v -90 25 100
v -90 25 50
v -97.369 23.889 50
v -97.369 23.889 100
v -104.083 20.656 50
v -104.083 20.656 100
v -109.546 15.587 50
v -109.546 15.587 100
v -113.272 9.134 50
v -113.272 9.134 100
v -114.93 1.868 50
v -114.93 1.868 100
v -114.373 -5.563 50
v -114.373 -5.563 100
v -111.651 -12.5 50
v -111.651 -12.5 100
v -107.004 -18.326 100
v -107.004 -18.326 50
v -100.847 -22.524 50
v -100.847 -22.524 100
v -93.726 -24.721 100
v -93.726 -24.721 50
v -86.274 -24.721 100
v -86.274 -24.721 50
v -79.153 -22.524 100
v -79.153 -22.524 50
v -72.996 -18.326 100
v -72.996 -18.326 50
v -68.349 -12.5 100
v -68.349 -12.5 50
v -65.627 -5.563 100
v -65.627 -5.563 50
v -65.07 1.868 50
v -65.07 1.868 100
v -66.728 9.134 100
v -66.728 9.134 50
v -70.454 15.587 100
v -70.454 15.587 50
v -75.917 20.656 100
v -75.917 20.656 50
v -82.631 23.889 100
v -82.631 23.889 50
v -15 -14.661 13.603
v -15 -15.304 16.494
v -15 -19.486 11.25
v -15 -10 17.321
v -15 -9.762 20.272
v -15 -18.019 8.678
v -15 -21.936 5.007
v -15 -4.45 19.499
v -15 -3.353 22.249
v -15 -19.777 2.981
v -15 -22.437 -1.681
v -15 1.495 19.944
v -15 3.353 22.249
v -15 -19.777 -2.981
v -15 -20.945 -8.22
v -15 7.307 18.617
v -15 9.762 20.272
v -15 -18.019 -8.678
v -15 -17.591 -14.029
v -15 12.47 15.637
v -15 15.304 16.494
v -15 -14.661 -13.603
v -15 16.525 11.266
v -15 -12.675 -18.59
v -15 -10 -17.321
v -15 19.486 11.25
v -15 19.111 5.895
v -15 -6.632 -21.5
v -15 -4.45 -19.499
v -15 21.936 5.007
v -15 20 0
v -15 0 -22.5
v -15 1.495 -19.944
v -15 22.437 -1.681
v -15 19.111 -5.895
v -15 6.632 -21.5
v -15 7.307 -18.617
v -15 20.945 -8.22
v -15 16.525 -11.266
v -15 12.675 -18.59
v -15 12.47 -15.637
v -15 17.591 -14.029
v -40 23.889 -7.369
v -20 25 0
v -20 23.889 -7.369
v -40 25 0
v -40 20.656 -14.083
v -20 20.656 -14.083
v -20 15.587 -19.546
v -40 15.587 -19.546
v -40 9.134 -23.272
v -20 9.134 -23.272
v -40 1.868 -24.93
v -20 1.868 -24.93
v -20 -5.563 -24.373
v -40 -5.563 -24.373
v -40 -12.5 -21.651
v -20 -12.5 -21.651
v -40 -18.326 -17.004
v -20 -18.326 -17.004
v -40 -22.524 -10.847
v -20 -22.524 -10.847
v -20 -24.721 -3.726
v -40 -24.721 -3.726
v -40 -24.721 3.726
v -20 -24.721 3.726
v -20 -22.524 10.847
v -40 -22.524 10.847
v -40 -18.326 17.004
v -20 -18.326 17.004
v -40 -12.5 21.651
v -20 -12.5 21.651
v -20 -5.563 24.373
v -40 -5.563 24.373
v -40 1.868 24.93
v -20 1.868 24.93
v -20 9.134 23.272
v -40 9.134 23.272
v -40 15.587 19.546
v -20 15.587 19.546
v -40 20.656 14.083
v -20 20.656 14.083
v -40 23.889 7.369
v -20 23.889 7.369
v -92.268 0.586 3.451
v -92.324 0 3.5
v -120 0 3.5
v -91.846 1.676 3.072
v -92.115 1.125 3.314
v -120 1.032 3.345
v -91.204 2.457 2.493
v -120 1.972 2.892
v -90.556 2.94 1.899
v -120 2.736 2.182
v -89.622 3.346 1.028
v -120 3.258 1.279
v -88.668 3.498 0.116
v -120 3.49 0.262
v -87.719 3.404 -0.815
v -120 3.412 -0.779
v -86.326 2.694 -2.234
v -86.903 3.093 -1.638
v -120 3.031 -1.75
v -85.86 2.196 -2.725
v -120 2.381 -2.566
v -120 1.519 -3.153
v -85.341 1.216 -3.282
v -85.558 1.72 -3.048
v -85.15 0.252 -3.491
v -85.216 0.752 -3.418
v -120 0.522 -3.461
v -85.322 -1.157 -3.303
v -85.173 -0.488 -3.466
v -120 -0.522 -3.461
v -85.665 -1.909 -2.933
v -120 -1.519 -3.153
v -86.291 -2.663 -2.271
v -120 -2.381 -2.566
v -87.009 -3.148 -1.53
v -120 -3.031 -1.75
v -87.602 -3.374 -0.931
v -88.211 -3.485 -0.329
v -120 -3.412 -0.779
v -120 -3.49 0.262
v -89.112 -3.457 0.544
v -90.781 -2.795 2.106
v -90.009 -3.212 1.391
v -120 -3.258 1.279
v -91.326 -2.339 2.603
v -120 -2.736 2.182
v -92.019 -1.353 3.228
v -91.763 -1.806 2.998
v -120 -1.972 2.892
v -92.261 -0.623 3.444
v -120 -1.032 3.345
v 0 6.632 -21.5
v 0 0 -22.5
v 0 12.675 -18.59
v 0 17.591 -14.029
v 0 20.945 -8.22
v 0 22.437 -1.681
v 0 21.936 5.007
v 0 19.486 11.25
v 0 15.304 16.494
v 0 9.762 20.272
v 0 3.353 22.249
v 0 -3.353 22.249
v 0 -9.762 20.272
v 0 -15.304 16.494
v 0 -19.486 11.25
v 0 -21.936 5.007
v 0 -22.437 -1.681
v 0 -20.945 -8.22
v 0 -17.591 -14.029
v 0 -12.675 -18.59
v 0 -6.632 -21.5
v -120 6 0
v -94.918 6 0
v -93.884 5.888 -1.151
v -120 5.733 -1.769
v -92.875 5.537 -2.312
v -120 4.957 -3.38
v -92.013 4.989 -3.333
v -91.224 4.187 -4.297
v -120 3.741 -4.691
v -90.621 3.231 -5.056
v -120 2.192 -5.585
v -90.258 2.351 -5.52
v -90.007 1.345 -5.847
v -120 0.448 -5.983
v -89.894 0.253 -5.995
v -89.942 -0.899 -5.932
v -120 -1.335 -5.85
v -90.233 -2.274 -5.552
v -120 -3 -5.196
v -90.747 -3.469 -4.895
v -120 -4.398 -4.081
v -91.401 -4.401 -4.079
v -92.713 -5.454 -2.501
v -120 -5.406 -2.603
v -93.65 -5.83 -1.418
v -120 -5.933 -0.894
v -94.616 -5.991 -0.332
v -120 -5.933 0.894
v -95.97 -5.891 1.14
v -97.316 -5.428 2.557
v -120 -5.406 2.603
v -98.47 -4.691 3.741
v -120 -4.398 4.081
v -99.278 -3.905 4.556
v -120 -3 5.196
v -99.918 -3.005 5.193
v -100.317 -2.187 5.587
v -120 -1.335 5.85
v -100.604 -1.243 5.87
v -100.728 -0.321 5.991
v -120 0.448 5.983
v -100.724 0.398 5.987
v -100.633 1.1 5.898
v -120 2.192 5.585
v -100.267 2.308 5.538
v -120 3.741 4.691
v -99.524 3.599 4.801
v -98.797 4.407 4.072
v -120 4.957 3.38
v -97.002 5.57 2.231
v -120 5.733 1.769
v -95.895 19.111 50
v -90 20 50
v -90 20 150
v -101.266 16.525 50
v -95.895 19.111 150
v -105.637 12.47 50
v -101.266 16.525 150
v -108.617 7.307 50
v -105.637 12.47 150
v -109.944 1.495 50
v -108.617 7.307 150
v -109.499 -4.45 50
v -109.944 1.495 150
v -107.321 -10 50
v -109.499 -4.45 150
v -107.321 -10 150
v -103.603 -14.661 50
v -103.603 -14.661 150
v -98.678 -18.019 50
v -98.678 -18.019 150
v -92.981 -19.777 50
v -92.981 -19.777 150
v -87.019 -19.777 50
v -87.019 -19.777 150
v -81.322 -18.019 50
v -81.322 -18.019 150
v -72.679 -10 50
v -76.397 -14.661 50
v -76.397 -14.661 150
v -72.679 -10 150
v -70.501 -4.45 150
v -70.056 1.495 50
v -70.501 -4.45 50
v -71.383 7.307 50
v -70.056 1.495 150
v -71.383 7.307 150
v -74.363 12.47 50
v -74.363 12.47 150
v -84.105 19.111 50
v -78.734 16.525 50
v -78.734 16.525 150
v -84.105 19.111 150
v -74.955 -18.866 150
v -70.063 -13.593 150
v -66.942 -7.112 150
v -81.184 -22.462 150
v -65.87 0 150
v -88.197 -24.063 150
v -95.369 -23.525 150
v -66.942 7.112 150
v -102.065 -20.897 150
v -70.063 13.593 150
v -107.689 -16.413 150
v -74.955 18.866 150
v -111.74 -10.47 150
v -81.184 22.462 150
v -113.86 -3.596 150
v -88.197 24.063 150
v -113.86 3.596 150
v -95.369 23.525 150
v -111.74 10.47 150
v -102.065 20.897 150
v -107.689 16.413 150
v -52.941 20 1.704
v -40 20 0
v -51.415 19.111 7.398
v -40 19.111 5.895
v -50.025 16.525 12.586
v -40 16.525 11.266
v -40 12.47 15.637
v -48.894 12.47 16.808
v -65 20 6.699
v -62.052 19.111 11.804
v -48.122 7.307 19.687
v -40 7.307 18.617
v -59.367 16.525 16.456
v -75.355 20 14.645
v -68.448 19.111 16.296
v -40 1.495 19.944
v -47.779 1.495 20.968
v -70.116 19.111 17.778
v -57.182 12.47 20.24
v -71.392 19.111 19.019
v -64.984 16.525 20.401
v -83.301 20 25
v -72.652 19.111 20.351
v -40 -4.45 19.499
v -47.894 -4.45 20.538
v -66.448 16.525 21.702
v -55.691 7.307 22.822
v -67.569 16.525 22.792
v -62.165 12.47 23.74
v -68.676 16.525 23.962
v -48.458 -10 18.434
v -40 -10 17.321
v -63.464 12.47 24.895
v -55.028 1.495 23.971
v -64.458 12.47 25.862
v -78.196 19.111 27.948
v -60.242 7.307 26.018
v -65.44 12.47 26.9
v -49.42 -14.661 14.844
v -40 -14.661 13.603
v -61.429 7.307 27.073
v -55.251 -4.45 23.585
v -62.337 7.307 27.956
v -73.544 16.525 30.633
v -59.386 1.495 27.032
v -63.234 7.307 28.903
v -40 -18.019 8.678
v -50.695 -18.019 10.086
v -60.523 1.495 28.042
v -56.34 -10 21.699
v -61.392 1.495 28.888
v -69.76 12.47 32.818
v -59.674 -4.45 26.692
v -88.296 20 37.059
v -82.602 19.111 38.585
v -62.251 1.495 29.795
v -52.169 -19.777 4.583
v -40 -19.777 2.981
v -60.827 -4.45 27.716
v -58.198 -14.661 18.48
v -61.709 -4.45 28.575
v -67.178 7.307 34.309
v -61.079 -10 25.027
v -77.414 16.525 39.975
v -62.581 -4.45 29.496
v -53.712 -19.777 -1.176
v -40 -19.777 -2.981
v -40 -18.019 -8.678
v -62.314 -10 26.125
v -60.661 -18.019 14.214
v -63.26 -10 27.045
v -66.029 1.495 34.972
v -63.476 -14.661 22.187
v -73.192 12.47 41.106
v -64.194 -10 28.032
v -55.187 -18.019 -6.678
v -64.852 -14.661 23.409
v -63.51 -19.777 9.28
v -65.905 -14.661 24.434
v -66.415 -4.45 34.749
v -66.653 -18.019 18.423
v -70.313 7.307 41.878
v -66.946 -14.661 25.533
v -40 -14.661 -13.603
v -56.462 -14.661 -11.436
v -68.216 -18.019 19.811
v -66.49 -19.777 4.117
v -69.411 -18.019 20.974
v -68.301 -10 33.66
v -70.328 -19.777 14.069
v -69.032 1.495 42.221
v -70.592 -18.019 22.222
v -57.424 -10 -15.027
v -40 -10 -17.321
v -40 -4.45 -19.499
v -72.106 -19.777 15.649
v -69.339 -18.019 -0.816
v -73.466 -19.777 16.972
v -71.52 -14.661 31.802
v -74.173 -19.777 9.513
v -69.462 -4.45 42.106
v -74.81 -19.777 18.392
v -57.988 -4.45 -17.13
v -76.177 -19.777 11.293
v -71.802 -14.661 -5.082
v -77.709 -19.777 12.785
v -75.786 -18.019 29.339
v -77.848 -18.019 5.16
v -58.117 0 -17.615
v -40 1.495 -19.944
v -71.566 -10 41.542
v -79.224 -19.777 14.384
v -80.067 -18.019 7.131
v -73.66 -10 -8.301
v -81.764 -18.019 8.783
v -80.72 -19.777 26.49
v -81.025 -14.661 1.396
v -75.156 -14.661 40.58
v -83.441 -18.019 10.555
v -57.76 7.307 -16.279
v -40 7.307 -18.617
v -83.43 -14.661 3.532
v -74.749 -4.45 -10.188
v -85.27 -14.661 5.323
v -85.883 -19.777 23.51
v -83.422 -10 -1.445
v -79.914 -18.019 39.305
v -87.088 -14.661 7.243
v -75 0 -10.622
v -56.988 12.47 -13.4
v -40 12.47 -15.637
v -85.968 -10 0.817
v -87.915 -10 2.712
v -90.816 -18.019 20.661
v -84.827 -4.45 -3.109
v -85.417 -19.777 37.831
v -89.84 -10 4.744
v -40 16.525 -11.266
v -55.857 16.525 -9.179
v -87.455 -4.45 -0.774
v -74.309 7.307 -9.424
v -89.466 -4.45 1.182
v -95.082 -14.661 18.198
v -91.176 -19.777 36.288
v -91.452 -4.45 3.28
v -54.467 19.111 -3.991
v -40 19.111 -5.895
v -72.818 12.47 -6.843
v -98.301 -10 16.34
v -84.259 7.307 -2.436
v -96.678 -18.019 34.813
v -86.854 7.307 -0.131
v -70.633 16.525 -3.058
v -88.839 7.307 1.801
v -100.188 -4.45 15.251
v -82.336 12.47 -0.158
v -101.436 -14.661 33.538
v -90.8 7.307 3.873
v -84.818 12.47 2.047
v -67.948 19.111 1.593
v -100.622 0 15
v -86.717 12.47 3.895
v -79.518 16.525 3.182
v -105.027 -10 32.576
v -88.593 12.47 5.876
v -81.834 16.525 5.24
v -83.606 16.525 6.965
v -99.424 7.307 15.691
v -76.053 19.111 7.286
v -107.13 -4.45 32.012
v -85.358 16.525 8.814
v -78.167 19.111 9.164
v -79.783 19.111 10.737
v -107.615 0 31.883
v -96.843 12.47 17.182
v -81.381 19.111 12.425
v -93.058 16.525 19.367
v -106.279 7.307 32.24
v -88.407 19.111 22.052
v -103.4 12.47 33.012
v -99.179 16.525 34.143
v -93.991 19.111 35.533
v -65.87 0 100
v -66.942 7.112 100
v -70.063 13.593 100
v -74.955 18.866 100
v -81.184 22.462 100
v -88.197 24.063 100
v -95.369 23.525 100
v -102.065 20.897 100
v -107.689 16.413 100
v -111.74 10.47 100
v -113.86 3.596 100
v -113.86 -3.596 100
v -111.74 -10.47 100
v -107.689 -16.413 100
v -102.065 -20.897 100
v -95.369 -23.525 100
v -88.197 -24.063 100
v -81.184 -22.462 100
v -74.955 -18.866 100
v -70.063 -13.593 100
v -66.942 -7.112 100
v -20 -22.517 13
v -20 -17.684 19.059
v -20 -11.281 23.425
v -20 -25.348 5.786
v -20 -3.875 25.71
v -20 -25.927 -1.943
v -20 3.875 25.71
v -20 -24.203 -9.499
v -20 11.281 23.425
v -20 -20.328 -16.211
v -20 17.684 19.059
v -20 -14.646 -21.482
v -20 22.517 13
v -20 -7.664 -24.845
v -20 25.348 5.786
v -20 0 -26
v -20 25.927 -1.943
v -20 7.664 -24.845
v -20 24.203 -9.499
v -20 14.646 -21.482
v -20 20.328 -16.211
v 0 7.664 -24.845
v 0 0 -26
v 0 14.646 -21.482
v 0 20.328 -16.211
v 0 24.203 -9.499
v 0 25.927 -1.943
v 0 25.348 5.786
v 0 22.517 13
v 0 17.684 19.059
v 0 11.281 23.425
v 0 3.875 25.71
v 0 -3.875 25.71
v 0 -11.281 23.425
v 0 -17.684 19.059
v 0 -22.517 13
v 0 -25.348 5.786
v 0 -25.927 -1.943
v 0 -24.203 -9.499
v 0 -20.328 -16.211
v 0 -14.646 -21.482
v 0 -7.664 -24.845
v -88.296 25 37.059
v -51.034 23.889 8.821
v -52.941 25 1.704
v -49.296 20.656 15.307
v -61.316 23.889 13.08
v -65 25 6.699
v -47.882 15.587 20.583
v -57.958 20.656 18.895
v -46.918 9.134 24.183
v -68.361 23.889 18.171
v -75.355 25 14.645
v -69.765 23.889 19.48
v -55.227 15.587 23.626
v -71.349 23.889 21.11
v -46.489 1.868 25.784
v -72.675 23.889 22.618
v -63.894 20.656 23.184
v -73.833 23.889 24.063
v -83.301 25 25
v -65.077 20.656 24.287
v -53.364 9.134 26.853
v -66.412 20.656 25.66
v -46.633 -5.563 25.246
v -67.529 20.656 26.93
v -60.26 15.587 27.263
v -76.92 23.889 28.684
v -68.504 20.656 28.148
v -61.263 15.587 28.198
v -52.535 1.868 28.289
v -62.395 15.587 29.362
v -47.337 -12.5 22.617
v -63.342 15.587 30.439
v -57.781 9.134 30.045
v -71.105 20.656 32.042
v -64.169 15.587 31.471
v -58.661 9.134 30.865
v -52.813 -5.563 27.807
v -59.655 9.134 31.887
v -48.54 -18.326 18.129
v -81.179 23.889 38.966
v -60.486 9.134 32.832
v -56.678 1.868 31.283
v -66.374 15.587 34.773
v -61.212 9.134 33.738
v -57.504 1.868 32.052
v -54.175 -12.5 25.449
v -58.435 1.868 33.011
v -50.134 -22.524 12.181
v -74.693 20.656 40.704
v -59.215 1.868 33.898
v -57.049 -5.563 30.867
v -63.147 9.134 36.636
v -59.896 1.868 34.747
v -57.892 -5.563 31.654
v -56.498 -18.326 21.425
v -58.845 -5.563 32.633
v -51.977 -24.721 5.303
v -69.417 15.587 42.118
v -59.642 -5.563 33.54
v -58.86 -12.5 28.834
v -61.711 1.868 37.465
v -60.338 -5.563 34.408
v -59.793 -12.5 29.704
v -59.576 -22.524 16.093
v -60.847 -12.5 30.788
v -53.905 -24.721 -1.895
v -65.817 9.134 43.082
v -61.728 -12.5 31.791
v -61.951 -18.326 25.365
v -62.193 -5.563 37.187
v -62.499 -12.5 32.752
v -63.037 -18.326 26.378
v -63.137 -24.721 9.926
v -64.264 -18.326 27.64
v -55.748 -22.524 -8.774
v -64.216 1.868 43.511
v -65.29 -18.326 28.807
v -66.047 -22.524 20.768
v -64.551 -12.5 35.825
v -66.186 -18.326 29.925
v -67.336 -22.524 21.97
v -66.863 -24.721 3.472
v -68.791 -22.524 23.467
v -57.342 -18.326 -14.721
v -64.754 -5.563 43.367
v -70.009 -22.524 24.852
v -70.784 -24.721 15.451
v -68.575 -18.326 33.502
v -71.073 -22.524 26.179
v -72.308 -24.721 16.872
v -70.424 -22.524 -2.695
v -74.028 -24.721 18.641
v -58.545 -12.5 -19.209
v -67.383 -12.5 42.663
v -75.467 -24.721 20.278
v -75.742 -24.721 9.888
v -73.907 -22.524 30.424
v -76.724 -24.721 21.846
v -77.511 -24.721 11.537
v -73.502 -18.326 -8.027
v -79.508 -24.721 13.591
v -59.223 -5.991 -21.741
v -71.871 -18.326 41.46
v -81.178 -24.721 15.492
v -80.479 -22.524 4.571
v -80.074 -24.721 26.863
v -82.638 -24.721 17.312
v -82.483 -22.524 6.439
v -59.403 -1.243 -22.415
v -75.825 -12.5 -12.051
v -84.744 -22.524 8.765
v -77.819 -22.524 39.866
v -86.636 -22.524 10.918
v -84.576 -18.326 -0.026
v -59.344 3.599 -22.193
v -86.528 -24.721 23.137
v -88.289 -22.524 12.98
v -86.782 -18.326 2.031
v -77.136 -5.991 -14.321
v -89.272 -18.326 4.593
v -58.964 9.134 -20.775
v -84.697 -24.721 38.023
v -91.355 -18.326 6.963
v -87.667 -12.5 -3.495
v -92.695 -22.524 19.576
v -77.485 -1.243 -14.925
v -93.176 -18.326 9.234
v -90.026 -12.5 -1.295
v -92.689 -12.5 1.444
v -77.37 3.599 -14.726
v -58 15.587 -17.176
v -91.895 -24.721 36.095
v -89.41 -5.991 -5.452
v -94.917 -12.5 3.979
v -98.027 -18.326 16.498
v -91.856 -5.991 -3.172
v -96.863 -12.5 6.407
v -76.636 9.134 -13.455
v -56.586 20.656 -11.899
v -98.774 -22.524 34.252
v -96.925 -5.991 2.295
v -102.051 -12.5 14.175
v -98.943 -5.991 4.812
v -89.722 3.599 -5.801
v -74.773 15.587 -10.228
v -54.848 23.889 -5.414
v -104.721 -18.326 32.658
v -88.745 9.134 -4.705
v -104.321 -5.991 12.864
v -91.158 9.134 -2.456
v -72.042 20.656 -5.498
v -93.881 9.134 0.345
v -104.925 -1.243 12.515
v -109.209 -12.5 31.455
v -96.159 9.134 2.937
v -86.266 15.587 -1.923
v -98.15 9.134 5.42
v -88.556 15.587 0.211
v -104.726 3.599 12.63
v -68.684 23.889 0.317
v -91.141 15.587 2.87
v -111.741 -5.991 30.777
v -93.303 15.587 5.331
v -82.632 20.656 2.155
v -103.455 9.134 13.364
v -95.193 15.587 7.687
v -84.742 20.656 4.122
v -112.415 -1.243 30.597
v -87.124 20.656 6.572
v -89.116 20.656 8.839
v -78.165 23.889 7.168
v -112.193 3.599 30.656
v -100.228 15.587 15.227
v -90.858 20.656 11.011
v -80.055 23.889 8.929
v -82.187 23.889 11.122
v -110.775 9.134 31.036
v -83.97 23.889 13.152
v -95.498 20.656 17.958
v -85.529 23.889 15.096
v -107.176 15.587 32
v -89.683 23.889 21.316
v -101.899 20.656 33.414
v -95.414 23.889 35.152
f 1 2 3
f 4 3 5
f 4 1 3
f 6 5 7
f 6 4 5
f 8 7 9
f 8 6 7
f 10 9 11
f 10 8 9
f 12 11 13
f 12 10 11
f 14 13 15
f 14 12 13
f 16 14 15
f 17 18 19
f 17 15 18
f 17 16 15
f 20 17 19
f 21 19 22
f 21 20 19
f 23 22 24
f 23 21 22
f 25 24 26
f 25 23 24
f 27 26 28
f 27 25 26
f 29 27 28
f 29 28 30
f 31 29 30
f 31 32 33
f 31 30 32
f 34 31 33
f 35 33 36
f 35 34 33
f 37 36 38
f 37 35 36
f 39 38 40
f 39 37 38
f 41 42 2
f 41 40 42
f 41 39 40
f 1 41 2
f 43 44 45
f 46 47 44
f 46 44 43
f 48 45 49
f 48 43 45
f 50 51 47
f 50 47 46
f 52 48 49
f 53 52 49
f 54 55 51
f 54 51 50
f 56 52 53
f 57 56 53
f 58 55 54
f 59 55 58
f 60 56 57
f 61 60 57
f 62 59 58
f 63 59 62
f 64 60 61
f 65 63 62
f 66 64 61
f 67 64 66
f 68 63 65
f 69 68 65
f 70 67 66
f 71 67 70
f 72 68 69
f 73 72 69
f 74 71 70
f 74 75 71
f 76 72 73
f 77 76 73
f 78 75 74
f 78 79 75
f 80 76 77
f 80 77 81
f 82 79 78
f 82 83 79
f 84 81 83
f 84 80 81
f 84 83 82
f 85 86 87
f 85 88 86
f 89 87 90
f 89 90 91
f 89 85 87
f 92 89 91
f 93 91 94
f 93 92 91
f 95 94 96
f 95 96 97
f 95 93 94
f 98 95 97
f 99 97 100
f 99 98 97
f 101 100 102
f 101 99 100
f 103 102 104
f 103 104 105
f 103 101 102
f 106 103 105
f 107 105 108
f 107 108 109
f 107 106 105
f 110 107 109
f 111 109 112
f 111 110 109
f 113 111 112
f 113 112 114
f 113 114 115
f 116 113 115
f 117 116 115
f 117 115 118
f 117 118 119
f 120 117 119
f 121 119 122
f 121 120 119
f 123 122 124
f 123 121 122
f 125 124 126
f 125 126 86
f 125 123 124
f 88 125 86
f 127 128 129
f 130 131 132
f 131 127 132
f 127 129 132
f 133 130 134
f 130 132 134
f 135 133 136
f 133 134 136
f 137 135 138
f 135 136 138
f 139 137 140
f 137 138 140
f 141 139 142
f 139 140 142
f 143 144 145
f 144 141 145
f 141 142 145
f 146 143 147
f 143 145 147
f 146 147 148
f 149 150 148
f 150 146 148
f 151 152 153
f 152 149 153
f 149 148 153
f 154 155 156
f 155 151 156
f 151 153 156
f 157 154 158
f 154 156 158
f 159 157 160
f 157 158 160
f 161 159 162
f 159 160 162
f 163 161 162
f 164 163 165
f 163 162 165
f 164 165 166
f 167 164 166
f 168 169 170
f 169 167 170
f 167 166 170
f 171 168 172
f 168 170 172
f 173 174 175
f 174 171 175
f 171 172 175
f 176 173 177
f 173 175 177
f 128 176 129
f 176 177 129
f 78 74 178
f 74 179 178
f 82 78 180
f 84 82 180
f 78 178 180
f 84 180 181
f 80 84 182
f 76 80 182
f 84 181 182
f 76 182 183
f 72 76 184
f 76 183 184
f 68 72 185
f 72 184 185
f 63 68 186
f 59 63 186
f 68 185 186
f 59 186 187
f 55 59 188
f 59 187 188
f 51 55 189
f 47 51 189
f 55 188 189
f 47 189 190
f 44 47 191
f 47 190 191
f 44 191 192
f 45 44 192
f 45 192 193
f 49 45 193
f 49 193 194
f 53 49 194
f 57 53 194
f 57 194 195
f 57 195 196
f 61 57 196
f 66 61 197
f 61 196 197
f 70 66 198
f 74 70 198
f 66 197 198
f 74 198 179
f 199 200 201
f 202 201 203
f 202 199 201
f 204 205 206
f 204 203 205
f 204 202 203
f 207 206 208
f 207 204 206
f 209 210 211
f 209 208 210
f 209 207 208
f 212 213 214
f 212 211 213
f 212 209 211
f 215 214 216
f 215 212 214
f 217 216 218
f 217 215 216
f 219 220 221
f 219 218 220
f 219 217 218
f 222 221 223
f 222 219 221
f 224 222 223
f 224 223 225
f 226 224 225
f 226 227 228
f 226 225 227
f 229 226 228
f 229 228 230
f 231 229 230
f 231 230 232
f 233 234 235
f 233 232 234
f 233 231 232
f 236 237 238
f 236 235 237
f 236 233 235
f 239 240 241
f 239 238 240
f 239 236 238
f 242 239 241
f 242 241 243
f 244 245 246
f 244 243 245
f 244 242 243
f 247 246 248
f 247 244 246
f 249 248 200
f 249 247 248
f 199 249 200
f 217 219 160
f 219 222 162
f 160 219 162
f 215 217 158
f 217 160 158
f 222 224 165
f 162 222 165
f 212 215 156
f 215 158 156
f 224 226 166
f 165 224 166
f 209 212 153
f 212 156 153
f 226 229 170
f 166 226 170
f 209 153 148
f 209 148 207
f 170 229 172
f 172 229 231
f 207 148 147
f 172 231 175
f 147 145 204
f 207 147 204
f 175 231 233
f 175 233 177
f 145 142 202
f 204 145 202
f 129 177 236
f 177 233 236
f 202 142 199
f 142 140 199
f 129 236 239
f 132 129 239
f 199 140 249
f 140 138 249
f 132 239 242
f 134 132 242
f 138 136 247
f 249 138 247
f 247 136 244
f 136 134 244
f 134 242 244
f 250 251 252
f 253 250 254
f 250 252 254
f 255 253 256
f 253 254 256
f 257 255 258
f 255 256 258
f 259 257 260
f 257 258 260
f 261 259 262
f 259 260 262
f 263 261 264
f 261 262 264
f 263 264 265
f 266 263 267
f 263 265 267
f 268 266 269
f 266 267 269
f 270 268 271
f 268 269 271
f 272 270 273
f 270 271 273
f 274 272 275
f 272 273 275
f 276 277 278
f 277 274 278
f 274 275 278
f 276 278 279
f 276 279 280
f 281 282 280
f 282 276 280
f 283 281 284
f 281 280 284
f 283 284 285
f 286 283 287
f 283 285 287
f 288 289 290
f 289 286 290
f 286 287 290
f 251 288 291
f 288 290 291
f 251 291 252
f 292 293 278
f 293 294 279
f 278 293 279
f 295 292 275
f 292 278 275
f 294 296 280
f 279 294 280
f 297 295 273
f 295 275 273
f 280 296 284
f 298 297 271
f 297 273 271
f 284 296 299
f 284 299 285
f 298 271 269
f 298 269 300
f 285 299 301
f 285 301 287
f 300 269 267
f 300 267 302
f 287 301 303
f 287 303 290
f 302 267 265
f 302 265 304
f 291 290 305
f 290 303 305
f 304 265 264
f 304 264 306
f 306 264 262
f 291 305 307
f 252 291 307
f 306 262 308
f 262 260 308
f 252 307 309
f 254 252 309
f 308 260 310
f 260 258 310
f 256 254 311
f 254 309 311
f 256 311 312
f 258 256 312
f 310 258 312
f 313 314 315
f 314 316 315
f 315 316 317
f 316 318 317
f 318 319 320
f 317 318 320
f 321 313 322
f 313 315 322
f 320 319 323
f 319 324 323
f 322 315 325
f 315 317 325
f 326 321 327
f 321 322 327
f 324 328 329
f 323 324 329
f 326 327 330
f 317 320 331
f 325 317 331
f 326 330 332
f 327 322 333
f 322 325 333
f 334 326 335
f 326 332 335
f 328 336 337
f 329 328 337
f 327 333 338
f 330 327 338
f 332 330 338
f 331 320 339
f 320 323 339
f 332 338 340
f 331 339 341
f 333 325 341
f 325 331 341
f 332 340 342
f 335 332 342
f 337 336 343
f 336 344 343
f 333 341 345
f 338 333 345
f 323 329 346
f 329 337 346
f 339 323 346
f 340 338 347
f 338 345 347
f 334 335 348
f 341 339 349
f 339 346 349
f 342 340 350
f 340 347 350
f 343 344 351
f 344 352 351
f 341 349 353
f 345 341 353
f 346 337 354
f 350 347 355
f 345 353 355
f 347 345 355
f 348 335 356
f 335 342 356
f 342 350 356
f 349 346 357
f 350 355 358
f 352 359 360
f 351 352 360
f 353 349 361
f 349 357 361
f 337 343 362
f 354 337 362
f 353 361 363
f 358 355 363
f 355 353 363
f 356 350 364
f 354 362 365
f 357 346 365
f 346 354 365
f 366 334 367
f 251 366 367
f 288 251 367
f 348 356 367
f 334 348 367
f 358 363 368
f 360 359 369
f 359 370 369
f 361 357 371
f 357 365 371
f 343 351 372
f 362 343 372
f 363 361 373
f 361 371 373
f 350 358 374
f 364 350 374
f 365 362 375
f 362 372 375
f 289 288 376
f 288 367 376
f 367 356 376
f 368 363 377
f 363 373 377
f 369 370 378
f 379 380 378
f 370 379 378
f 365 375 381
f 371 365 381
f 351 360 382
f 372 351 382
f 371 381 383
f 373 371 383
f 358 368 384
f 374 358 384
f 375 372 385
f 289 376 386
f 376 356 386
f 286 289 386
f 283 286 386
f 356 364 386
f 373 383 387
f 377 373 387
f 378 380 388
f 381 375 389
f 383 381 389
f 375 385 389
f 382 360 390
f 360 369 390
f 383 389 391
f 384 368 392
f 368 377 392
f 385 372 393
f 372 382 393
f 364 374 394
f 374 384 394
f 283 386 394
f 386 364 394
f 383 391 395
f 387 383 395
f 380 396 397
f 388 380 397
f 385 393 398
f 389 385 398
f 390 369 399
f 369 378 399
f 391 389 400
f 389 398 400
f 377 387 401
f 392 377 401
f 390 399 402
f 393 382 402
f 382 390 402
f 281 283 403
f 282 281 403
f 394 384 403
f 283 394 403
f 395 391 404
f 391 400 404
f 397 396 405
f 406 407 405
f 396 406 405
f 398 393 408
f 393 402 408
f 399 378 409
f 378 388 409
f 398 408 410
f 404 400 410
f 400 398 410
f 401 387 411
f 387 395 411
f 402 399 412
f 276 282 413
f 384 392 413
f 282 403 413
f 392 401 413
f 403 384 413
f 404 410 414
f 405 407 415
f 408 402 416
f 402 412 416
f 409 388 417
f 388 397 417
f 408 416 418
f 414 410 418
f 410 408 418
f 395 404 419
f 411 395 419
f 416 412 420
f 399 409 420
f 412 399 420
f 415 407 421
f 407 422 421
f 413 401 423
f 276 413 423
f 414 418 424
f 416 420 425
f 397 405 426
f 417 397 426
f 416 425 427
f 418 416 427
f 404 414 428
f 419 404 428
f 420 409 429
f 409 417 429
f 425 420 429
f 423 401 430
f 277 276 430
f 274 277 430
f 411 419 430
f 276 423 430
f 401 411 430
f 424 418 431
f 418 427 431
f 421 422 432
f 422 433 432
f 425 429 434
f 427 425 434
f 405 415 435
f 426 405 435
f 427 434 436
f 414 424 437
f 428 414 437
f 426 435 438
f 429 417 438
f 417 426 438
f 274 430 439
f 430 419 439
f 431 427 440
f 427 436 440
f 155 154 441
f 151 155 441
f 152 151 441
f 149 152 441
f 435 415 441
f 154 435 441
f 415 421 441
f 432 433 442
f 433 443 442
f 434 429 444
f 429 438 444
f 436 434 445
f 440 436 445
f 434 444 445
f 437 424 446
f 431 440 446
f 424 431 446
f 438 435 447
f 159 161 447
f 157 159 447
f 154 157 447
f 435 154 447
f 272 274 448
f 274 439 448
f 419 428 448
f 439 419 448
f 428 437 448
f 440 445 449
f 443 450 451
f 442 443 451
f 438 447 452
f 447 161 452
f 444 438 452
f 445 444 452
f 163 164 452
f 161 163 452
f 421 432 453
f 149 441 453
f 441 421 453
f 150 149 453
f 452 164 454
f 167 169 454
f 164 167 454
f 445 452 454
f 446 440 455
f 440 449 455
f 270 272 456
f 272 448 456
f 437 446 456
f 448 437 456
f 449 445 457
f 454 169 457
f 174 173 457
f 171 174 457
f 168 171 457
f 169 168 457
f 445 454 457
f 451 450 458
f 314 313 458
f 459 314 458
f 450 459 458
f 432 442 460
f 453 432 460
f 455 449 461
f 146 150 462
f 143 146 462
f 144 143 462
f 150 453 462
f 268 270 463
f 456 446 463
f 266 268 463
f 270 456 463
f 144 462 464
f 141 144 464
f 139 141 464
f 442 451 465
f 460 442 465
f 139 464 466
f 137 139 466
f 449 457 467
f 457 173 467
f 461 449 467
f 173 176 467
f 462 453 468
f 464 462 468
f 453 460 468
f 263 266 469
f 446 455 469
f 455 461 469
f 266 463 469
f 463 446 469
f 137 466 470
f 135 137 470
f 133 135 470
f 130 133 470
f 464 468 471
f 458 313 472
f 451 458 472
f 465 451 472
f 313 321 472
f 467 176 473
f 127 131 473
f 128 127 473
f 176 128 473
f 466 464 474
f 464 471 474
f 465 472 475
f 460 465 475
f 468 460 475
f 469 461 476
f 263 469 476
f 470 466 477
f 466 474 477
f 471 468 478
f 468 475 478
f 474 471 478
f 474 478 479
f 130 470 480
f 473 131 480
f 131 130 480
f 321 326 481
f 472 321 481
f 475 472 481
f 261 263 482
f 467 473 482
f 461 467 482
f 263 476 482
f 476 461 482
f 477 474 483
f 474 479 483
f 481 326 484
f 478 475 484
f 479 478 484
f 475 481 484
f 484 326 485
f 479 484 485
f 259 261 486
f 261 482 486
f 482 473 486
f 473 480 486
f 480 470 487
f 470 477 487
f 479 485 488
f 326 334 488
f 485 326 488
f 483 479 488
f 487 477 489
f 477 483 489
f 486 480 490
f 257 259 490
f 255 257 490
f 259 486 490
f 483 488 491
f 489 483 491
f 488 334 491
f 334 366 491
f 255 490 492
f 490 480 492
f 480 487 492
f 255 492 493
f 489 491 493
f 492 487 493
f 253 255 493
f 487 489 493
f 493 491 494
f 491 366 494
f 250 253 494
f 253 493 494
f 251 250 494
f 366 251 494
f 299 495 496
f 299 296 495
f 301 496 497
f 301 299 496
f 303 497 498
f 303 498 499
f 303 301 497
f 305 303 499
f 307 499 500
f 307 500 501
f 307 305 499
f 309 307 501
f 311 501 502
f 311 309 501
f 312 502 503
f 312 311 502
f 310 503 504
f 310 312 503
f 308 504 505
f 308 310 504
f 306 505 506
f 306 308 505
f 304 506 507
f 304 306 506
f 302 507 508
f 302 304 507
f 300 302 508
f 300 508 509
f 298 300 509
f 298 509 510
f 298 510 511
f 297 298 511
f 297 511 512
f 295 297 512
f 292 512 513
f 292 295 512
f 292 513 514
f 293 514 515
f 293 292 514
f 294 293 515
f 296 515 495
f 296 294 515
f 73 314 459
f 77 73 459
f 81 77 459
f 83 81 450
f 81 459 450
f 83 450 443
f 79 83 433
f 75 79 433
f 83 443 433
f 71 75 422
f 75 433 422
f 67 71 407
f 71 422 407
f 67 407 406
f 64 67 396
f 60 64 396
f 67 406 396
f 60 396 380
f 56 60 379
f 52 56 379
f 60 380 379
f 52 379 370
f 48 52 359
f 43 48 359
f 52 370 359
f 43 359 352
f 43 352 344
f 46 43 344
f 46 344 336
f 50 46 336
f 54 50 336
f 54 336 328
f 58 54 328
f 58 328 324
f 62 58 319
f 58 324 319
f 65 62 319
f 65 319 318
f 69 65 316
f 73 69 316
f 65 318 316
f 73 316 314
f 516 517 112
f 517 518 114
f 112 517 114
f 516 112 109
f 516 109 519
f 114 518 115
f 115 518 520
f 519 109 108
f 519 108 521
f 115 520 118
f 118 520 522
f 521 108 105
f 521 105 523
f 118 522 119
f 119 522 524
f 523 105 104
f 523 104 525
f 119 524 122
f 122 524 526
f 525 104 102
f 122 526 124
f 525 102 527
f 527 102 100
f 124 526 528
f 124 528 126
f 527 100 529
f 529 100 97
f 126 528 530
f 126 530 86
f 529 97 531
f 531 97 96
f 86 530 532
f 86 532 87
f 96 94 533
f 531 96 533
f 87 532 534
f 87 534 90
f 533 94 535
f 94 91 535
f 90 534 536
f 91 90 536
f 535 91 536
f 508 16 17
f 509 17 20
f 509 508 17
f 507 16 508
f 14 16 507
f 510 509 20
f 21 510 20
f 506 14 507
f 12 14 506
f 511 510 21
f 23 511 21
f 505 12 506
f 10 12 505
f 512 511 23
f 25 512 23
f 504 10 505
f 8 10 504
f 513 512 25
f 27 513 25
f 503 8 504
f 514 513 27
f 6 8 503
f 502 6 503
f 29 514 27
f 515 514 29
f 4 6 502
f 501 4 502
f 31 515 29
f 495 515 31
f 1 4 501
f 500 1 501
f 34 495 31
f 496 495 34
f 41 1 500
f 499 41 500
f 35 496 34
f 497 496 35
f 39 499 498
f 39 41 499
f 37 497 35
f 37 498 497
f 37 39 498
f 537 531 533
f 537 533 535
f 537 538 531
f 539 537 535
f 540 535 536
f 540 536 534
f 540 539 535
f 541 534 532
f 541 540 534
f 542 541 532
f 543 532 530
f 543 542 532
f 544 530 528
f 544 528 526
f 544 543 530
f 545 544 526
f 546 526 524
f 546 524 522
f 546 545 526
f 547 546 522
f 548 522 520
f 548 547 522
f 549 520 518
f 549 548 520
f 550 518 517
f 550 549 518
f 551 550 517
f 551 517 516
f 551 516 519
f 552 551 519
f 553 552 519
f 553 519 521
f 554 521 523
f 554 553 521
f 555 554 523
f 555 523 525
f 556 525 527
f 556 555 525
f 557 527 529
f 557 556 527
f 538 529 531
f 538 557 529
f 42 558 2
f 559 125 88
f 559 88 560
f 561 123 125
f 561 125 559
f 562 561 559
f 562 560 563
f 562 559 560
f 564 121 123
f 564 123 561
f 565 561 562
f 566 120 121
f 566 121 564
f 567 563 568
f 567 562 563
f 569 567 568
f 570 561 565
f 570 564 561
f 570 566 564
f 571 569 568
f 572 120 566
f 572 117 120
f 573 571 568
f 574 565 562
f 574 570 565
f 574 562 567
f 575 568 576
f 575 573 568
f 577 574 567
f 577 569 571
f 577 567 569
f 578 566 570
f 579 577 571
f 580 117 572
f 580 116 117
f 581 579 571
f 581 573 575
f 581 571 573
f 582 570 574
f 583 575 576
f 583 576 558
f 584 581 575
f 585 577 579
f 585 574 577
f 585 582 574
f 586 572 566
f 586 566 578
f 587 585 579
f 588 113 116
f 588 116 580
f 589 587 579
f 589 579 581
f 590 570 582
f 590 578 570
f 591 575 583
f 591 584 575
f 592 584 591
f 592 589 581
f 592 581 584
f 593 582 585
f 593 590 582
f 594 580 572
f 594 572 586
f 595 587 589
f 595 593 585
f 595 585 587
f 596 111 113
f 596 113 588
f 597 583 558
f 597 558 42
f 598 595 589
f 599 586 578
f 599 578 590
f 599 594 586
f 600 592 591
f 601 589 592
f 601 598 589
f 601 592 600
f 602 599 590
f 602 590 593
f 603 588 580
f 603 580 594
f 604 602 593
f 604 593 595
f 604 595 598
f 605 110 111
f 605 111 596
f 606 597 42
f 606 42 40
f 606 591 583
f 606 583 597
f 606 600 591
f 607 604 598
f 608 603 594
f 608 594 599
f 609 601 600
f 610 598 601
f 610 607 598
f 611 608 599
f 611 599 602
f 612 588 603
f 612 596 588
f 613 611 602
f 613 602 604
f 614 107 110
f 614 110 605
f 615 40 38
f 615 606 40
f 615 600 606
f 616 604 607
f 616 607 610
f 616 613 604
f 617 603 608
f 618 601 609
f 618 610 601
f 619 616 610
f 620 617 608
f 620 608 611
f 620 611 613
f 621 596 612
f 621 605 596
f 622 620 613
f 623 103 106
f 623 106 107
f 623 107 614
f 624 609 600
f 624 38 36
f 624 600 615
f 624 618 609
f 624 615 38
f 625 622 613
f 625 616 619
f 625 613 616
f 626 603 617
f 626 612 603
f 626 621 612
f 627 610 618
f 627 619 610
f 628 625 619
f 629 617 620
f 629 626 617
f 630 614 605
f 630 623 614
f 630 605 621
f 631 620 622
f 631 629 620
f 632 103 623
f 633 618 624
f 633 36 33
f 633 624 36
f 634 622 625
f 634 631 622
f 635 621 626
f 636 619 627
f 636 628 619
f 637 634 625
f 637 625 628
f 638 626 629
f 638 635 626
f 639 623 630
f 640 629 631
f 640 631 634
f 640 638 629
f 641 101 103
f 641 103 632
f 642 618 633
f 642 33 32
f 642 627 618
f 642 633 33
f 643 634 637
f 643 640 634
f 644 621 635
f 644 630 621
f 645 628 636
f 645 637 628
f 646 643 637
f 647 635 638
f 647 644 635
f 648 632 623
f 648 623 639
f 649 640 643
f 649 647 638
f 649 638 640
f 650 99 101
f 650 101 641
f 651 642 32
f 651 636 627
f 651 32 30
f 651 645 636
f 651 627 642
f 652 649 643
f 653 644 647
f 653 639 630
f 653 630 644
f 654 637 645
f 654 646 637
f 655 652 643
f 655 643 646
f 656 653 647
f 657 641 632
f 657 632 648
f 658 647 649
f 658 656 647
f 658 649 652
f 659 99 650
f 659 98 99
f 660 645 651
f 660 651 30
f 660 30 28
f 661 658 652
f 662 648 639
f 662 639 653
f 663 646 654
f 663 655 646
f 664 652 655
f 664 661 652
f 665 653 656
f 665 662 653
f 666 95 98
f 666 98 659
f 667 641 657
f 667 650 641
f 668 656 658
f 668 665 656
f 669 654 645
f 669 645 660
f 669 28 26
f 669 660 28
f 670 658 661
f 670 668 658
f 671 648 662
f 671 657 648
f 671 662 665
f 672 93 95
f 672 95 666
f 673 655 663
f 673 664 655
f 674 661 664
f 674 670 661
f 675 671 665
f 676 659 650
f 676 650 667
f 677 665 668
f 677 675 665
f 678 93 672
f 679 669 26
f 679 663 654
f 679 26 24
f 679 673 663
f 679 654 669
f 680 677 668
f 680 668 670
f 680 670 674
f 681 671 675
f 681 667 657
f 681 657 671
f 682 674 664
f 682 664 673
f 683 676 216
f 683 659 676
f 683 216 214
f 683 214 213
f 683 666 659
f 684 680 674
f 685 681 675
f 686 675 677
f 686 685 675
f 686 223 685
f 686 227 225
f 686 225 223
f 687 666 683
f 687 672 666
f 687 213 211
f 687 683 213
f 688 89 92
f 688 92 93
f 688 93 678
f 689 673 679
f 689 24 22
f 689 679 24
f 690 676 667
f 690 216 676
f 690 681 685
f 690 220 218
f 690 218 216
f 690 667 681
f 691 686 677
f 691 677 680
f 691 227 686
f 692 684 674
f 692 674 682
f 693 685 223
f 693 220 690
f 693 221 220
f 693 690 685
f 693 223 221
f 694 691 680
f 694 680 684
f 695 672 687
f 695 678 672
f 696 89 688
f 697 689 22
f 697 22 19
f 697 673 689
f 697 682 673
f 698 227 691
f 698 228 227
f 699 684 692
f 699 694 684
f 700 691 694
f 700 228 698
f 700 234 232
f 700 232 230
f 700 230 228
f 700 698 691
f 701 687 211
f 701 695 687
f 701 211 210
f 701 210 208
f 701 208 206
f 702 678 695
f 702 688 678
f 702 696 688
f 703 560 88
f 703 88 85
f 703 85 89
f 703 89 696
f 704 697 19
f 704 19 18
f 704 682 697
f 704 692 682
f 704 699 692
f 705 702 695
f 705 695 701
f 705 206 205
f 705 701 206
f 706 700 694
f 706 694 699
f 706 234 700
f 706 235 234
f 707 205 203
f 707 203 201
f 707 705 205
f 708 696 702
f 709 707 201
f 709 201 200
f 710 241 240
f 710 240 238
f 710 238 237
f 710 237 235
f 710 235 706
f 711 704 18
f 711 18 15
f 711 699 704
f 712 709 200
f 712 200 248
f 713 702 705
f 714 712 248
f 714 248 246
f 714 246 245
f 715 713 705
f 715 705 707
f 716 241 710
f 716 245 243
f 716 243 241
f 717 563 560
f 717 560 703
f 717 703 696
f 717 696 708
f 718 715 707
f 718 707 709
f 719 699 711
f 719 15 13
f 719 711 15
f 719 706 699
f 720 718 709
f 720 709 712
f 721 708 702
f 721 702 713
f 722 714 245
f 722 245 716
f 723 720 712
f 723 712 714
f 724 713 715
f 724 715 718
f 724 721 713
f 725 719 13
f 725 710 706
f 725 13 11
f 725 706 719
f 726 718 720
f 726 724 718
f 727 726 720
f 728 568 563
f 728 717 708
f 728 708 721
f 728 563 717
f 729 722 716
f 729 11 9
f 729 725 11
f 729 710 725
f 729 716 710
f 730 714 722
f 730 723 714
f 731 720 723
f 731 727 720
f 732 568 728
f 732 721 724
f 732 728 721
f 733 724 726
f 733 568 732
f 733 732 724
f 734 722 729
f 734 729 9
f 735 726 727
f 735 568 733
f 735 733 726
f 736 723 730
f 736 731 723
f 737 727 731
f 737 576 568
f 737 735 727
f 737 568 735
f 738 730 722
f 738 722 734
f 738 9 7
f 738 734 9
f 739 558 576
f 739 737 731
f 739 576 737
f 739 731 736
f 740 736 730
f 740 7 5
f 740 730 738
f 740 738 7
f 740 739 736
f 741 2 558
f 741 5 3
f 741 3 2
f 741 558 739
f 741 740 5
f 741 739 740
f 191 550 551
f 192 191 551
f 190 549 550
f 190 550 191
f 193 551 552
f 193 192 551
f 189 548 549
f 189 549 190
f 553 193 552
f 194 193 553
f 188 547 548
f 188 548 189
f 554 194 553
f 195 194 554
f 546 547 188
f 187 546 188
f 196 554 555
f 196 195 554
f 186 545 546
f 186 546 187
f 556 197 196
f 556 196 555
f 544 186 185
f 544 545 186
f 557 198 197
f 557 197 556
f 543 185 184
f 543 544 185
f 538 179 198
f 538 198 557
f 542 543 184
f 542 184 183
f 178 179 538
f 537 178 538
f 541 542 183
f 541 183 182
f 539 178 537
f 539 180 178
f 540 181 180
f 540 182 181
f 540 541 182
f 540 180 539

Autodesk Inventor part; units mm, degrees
ref_plane "XZ Plane" through (0, 0, 0) normal (0, 1, 0) x (-1, 0, 0)
ref_plane "XY Plane" through (0, 0, 0) normal (0, 0, 1) x (1, 0, 0)
sketch "Sketch1" plane through (0, 0, 0) normal (0, 1, 0) x (-1, 0, 0)
  line L0 (0, 0) -> (40, 0)
  line L1 (90, 50) -> (90, 150)
  arc A0 (40, 0) -> (90, 50) centre (40, 50) ccw
  point P0 (90, 0)
  dimension "d0" = 90
  dimension "d1" = 150
  dimension "d2" = 50
sketch "Sketch2" plane through (0, 0, 0) normal (1, 0, 0) x (0, 1, 0)
  circle A0 centre (0, 0) radius 25
  dimension "d3" = 50
sweep "Sweep1" add profiles "Sketch2" path "Sketch1"
shell "Shell1" thickness 5 removed faces 2 at (0, -6.2376, 1.5374) at (-91.9943, -6.0822, 150)
sketch "Sketch3" plane through (0, 0, 0) normal (1, 0, 0) x (0, 0, -1)
  circle A0 centre (0, 0) radius 26
  circle A1 centre (0, 0) radius 25 projected
  dimension "d7" = 52
extrude "Extrusion1" add sketch "Sketch3" against normal blind 20
sketch "Sketch5" plane through (-90, 0, 150) normal (0, 0, 1) x (1, 0, 0)
  circle A0 centre (0, 0) radius 24.13
  circle A1 centre (0, 0) radius 25 projected
  point P0 (90, 0)
  dimension "d11" = 48.26
extrude "Extrusion2" cut sketch "Sketch5" against normal blind 50
ref_plane "Work Plane1" through (-120, 0, 0) normal (1, 0, 0) x (0, 1, 0)
sketch "Sketch6" plane through (-120, 0, 0) normal (1, 0, 0) x (0, 1, 0)
  circle A0 centre (0, 0) radius 6
  dimension "d15" = 12
extrude "Extrusion3" add sketch "Sketch6" along normal up to surface
sketch "Sketch8" plane through (-120, 0, 0) normal (-1, 0, 0) x (0, 0, 1)
  circle A0 centre (0, 0) radius 3.5
  dimension "d22" = 7
extrude "Extrusion4" cut sketch "Sketch8" against normal through all
sketch "Sketch9" plane through (0, 0, 0) normal (1, 0, 0) x (0, 0, -1)
  circle A0 centre (0, 0) radius 22.5
  circle A1 centre (0, 0) radius 20 projected
  dimension "d25" = 45
extrude "Extrusion5" cut sketch "Sketch9" against normal blind 15
properties part number "FEE-PIPE"
